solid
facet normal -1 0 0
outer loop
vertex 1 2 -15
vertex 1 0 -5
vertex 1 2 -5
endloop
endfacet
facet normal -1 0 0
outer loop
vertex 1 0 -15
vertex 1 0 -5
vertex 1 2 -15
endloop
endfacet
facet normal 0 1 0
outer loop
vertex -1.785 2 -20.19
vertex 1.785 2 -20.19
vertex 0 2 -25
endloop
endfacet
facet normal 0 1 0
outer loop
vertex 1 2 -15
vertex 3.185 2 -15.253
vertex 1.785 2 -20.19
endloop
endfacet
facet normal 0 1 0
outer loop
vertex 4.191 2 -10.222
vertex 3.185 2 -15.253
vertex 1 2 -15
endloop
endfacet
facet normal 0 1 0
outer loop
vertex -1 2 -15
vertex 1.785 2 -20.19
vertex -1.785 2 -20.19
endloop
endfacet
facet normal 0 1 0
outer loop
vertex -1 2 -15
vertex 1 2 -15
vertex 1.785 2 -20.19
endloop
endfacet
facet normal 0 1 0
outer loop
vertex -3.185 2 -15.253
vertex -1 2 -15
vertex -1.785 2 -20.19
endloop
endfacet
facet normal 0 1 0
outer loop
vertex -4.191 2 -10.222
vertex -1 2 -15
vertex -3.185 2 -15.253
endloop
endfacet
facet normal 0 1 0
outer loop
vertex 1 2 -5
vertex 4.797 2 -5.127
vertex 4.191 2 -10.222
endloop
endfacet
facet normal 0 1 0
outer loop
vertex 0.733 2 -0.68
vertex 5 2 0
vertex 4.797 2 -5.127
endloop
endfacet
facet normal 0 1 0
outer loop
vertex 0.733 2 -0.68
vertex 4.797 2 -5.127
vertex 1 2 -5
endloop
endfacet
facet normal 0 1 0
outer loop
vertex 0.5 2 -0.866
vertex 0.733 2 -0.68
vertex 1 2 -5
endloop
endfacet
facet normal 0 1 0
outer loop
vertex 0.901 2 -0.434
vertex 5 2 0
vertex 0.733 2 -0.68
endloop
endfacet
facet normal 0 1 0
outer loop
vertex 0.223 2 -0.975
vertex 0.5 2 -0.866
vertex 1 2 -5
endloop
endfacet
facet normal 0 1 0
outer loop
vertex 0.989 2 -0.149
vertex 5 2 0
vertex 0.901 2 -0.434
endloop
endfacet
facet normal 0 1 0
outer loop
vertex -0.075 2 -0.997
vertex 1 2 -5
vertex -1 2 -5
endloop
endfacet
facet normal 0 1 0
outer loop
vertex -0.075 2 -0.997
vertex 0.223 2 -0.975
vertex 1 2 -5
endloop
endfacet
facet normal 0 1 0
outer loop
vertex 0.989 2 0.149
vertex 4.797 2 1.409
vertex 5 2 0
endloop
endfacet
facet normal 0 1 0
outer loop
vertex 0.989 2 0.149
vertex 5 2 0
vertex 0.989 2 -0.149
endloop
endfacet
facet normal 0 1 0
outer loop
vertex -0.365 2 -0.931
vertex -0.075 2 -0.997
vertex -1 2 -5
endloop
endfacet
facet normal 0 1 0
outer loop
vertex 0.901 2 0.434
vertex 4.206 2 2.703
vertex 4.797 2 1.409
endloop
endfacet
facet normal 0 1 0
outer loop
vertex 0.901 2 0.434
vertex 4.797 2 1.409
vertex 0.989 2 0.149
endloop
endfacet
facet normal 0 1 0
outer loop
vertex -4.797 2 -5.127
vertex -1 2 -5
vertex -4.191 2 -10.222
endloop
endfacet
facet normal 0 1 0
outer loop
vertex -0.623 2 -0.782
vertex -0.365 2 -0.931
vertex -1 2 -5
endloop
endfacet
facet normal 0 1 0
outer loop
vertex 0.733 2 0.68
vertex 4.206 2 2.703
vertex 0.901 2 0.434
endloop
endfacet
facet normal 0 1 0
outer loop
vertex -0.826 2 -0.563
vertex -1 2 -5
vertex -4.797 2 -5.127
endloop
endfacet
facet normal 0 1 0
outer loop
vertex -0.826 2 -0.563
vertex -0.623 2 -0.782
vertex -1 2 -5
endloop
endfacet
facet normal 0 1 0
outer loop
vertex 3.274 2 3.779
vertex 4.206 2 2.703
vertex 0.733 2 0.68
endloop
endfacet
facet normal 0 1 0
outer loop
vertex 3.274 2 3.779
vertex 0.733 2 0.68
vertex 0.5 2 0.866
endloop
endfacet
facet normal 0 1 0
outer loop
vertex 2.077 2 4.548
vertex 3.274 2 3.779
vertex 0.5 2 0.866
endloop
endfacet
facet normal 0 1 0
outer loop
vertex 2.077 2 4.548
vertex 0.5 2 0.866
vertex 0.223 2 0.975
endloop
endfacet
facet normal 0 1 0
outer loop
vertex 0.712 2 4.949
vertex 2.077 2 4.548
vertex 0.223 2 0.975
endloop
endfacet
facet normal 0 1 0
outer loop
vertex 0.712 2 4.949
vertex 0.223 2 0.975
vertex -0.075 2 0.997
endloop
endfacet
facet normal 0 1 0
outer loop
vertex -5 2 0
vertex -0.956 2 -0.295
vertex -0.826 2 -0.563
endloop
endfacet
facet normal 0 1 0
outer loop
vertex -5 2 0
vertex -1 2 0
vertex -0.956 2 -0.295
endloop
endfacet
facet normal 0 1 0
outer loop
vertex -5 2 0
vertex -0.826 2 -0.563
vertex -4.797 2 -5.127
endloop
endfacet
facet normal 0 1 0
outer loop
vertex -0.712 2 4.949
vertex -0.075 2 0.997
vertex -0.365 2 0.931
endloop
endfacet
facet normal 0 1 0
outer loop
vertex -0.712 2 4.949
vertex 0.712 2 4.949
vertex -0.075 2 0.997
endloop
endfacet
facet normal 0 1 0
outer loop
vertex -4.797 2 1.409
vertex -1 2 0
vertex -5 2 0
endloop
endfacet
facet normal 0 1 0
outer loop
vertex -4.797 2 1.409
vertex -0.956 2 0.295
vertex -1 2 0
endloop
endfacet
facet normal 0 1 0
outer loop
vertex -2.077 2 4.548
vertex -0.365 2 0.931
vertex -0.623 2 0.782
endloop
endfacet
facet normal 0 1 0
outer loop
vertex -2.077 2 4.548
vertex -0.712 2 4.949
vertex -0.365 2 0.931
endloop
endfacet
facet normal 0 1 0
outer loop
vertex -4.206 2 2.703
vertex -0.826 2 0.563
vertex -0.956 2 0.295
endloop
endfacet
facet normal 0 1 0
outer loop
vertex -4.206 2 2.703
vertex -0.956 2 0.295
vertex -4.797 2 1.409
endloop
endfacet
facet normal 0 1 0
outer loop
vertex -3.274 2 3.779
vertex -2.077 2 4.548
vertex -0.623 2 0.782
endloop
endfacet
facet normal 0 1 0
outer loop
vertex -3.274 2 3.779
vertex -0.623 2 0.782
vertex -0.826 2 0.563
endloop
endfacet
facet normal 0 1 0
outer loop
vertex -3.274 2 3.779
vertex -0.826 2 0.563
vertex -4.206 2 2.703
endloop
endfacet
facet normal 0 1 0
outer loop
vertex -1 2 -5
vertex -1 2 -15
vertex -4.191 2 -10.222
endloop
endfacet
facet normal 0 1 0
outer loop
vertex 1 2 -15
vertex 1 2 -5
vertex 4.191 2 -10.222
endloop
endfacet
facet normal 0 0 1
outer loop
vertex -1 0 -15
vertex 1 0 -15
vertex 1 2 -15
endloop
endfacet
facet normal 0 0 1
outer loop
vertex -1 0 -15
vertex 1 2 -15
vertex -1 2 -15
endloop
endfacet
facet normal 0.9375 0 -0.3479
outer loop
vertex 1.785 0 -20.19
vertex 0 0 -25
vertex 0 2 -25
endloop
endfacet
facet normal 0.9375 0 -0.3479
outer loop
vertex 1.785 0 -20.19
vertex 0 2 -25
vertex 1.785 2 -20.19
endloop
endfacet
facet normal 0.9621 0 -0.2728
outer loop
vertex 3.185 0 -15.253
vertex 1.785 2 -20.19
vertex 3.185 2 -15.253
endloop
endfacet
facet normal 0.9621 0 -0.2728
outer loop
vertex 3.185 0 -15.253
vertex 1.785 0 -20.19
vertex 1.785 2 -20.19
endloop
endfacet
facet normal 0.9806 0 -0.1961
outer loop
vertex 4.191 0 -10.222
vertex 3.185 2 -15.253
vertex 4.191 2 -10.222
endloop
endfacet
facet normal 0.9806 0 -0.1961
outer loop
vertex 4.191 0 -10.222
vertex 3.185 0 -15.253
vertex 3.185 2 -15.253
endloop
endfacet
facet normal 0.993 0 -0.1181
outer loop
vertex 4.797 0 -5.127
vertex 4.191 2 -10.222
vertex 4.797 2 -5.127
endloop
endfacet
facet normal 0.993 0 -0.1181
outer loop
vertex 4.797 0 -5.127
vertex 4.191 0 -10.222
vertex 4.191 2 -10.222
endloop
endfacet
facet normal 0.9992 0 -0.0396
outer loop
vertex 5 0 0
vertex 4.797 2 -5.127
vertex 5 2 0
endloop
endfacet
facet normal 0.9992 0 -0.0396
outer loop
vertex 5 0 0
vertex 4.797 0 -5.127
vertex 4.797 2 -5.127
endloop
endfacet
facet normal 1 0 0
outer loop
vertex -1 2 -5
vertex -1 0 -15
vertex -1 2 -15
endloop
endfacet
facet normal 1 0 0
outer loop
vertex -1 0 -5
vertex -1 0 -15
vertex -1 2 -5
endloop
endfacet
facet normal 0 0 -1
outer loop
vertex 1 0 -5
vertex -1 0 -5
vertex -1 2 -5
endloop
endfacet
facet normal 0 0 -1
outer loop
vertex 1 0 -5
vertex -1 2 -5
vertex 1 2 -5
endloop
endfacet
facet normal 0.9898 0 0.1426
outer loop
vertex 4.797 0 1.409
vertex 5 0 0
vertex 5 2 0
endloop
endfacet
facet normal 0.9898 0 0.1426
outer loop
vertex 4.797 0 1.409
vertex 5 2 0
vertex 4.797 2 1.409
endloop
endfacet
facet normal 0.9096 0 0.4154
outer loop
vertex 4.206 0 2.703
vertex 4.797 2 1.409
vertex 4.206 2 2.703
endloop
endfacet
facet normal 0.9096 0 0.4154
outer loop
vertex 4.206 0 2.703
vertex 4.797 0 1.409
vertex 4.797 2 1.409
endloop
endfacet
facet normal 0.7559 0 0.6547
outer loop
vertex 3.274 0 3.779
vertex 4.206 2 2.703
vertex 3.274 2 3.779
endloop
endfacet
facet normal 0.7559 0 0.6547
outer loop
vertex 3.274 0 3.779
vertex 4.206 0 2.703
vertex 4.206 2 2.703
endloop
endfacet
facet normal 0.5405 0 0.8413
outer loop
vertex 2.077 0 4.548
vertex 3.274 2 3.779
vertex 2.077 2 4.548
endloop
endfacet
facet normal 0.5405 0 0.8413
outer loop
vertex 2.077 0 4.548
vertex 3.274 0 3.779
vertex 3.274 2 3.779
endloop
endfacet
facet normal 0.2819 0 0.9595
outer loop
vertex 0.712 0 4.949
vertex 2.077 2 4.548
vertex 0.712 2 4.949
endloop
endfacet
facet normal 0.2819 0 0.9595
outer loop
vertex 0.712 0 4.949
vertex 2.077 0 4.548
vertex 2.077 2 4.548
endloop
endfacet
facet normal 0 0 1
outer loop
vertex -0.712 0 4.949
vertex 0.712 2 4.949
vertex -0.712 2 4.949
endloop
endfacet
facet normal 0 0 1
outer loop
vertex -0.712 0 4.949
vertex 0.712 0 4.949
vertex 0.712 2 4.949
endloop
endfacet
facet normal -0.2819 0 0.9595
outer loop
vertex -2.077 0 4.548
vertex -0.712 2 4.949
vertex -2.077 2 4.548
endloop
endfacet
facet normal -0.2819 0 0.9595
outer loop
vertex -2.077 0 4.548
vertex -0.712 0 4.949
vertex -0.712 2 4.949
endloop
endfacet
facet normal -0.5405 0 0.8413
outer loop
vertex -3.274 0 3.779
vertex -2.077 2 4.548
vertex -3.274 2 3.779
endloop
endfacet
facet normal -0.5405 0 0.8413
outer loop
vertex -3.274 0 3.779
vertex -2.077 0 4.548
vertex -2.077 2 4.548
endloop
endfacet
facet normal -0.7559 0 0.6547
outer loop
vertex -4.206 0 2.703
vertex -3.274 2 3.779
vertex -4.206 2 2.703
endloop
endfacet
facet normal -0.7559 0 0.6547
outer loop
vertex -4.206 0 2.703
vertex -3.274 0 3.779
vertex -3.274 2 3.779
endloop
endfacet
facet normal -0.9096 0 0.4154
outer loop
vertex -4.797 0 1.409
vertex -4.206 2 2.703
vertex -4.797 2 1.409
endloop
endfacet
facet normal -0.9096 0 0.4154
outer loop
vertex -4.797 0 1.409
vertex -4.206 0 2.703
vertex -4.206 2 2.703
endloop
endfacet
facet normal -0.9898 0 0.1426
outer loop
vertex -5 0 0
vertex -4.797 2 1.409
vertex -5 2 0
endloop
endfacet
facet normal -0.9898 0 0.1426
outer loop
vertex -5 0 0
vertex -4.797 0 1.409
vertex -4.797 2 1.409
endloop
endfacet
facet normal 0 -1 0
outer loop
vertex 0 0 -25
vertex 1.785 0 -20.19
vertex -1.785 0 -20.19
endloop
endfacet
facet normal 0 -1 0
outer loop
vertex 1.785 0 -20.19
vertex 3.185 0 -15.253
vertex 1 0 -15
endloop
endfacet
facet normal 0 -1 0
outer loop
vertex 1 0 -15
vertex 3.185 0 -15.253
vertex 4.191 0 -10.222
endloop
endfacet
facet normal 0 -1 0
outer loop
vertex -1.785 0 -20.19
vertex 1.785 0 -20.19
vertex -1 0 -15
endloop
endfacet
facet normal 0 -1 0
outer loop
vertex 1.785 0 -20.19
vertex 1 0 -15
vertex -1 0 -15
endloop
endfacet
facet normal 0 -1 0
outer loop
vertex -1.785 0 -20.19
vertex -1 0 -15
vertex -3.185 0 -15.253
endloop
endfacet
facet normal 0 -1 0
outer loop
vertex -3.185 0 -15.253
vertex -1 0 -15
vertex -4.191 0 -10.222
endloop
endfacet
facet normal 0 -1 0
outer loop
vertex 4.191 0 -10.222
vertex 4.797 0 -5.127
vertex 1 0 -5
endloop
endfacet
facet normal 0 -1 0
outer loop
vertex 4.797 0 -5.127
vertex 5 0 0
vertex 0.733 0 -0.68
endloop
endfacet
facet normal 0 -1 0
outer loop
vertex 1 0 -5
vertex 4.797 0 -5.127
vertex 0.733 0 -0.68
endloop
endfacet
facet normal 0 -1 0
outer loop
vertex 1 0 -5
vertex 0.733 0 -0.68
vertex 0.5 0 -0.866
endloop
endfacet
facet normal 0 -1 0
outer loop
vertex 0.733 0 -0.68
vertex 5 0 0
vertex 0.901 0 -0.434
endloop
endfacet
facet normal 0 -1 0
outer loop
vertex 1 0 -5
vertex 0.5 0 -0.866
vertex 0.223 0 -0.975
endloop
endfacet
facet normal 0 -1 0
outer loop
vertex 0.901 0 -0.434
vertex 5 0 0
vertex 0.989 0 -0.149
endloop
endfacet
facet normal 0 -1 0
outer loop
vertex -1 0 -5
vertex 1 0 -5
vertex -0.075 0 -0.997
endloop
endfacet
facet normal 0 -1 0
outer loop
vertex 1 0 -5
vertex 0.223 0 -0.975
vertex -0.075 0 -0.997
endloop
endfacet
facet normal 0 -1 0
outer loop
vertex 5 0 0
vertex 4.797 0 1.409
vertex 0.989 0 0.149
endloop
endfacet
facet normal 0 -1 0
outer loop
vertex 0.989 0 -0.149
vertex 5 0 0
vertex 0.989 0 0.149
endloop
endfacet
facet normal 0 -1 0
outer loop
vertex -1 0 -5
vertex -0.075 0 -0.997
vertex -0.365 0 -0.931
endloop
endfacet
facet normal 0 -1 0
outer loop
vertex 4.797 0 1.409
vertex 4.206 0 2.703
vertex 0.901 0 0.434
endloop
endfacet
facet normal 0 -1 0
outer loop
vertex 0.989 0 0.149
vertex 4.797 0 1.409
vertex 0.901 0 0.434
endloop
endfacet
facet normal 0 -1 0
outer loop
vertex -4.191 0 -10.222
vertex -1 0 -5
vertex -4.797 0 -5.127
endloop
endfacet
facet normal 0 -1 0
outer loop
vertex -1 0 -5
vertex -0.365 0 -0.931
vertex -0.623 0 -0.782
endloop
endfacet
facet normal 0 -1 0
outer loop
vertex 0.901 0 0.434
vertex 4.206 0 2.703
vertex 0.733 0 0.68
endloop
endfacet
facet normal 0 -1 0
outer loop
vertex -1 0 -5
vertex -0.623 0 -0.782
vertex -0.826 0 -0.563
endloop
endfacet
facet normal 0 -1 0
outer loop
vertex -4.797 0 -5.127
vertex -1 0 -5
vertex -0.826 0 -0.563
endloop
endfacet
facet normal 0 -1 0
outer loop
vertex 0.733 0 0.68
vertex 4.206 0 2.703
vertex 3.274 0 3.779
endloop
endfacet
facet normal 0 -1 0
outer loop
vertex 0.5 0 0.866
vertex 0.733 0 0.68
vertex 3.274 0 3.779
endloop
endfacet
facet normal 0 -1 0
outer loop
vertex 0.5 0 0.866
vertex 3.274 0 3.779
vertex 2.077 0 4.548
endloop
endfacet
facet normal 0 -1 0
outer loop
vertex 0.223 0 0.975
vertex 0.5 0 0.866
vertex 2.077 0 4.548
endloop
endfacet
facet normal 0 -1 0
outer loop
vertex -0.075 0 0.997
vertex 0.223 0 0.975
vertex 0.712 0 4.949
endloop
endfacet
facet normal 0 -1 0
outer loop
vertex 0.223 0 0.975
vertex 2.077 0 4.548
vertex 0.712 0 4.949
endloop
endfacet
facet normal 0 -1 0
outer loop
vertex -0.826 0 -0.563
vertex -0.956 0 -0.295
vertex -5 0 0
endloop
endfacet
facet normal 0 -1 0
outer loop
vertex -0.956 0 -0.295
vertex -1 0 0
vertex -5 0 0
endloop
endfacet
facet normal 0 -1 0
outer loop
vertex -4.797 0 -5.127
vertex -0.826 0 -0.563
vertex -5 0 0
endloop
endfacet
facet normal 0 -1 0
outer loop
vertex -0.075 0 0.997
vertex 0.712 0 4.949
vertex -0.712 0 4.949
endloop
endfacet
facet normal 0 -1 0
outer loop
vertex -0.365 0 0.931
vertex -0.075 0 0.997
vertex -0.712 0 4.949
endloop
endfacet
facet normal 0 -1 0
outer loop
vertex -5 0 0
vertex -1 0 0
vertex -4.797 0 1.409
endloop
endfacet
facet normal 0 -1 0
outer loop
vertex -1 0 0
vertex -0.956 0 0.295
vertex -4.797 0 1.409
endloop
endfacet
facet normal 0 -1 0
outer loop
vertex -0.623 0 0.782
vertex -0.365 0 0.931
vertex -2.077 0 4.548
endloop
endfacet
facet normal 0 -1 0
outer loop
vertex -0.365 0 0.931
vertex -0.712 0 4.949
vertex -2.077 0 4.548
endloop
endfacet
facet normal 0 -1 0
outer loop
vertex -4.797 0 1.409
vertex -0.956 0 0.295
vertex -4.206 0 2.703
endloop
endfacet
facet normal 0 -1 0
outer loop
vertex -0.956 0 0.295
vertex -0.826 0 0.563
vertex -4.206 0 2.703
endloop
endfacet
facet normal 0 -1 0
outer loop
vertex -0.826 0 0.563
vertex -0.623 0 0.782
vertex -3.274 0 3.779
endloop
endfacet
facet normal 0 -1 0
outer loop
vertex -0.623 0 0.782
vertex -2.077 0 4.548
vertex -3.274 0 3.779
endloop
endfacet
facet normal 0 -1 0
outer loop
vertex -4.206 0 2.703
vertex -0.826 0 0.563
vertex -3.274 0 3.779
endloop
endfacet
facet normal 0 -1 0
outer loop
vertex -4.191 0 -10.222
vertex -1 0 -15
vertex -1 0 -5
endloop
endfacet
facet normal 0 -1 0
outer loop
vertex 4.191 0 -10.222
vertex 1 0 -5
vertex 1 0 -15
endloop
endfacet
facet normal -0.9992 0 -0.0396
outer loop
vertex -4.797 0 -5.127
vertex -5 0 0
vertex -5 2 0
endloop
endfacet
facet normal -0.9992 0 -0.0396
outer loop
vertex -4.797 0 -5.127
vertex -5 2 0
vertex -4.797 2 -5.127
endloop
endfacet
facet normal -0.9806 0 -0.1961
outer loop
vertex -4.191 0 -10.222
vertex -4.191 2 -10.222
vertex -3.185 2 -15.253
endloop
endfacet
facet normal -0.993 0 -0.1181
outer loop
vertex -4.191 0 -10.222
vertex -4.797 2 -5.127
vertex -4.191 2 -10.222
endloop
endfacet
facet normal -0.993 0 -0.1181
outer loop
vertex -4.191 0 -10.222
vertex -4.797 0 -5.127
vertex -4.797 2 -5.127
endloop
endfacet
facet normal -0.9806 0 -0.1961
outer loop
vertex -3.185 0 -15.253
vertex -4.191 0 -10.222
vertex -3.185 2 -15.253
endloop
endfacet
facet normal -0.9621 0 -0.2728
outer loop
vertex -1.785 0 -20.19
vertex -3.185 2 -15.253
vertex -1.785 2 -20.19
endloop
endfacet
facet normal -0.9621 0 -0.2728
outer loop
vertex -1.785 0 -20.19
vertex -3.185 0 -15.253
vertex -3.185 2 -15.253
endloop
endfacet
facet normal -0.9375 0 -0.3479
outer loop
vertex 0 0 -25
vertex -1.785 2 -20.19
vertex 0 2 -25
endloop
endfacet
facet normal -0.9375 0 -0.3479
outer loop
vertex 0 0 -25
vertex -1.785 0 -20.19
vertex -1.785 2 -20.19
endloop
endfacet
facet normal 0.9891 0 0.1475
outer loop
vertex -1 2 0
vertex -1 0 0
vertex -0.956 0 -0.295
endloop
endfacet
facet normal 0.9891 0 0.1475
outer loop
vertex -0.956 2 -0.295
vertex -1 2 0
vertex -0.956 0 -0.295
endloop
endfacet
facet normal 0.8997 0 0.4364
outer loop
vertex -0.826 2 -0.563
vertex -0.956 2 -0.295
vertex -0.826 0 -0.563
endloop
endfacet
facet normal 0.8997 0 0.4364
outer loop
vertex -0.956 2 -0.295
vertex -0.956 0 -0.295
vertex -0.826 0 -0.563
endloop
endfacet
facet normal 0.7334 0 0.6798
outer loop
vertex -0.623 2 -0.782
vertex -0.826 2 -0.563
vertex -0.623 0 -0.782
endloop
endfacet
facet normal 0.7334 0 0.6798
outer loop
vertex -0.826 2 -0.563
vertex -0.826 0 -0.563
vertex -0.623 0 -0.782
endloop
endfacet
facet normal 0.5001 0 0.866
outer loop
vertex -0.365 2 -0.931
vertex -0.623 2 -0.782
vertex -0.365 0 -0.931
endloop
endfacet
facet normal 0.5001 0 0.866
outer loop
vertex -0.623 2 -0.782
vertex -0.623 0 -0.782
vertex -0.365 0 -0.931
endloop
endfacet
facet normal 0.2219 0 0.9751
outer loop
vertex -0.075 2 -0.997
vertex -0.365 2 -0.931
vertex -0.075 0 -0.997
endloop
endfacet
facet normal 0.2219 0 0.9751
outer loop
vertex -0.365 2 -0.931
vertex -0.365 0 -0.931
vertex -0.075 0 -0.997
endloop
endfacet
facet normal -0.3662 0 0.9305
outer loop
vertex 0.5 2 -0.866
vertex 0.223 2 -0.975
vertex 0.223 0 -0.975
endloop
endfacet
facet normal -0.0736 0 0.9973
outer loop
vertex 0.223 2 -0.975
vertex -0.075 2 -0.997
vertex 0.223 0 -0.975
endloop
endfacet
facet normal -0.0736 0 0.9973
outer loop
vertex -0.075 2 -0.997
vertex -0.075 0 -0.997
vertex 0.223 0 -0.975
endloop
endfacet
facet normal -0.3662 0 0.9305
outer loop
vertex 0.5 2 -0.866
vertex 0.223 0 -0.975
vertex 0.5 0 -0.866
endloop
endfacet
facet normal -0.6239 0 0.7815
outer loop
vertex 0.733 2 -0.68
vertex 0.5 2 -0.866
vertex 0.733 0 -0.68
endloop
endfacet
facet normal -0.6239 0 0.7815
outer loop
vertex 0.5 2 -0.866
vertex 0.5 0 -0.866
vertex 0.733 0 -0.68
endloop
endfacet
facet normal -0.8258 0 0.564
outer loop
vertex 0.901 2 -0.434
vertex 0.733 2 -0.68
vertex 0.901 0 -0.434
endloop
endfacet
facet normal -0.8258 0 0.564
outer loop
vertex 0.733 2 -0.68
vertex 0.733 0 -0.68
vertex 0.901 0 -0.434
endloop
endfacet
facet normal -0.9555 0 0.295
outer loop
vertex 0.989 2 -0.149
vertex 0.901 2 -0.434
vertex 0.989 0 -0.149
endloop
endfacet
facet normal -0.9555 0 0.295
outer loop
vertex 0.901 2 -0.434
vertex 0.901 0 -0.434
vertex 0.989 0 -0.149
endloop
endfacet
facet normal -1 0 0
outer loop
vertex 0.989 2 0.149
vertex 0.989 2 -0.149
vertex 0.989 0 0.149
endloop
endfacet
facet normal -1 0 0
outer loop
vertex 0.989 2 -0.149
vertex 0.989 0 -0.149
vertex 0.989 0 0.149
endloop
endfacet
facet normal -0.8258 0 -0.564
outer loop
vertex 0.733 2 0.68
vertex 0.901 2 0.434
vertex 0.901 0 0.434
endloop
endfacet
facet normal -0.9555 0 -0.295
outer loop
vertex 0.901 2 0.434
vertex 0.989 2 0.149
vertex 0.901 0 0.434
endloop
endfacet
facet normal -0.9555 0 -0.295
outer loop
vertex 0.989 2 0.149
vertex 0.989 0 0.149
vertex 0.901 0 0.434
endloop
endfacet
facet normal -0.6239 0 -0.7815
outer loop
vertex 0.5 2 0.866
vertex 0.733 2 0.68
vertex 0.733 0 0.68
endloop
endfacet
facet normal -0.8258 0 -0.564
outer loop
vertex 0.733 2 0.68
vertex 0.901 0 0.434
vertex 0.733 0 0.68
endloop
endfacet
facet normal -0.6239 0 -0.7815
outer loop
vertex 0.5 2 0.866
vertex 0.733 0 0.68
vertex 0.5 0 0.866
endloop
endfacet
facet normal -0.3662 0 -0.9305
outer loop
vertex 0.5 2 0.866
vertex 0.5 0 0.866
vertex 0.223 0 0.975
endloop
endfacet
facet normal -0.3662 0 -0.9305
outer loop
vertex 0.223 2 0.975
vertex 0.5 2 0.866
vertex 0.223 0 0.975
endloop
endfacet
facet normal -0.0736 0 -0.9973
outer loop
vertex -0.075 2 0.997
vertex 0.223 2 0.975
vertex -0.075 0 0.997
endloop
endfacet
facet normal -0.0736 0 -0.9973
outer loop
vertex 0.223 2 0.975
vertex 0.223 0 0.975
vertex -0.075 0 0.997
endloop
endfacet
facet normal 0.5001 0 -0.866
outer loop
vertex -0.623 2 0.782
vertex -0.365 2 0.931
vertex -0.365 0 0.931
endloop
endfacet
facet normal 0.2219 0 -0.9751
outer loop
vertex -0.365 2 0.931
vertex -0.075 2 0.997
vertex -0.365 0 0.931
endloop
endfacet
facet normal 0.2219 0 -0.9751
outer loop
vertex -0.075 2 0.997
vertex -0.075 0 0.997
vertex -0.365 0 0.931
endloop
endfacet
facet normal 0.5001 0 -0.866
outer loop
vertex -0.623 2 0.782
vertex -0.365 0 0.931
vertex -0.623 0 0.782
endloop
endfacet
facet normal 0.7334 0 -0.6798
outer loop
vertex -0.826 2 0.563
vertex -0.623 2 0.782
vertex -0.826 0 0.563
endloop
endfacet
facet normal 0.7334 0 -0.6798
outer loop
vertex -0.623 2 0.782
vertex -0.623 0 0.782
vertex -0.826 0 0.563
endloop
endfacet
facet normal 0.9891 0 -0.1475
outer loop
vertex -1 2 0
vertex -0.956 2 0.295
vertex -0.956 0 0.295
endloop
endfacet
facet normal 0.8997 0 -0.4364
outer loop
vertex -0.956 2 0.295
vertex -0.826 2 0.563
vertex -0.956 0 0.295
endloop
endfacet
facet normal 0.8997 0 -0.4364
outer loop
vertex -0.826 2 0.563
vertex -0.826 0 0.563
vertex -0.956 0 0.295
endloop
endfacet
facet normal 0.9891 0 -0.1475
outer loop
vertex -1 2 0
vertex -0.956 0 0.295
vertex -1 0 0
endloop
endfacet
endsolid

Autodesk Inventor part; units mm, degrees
ref_plane "YZ Plane" through (0, 0, 0) normal (1, 0, 0) x (0, 1, 0)
ref_plane "XZ Plane" through (0, 0, 0) normal (0, 1, 0) x (-1, 0, 0)
ref_plane "XY Plane" through (0, 0, 0) normal (0, 0, 1) x (1, 0, 0)
sketch "Sketch1" plane through (0, 0, 0) normal (0, 1, 0) x (-1, 0, 0)
  arc A0 (5, 0) -> (-5, 0) centre (0, 0) ccw
  arc A1 (0, -25) -> (5, 0) centre (-60, 0) ccw
  arc A2 (-5, 0) -> (0, -25) centre (60, 0) ccw
  circle A3 centre (0, 0) radius 1
  line L0 (1, -5) -> (-1, -5)
  line L1 (-1, -5) -> (-1, -15)
  line L2 (-1, -15) -> (1, -15)
  line L3 (1, -15) -> (1, -5)
  dimension "d0" = 5
  dimension "d1" = 0
  dimension "d2" = 0
  dimension "d3" = 0
  dimension "d4" = 0
  dimension "d5" = 0
  dimension "d6" = 25
  dimension "d7" = 2
  dimension "d10" = 10
  dimension "d11" = 2
  dimension "d12" = 1
  dimension "d13" = 5
extrude "Extrusion2" add sketch "Sketch1" along normal blind 2
properties part number "aileron_arriere"
